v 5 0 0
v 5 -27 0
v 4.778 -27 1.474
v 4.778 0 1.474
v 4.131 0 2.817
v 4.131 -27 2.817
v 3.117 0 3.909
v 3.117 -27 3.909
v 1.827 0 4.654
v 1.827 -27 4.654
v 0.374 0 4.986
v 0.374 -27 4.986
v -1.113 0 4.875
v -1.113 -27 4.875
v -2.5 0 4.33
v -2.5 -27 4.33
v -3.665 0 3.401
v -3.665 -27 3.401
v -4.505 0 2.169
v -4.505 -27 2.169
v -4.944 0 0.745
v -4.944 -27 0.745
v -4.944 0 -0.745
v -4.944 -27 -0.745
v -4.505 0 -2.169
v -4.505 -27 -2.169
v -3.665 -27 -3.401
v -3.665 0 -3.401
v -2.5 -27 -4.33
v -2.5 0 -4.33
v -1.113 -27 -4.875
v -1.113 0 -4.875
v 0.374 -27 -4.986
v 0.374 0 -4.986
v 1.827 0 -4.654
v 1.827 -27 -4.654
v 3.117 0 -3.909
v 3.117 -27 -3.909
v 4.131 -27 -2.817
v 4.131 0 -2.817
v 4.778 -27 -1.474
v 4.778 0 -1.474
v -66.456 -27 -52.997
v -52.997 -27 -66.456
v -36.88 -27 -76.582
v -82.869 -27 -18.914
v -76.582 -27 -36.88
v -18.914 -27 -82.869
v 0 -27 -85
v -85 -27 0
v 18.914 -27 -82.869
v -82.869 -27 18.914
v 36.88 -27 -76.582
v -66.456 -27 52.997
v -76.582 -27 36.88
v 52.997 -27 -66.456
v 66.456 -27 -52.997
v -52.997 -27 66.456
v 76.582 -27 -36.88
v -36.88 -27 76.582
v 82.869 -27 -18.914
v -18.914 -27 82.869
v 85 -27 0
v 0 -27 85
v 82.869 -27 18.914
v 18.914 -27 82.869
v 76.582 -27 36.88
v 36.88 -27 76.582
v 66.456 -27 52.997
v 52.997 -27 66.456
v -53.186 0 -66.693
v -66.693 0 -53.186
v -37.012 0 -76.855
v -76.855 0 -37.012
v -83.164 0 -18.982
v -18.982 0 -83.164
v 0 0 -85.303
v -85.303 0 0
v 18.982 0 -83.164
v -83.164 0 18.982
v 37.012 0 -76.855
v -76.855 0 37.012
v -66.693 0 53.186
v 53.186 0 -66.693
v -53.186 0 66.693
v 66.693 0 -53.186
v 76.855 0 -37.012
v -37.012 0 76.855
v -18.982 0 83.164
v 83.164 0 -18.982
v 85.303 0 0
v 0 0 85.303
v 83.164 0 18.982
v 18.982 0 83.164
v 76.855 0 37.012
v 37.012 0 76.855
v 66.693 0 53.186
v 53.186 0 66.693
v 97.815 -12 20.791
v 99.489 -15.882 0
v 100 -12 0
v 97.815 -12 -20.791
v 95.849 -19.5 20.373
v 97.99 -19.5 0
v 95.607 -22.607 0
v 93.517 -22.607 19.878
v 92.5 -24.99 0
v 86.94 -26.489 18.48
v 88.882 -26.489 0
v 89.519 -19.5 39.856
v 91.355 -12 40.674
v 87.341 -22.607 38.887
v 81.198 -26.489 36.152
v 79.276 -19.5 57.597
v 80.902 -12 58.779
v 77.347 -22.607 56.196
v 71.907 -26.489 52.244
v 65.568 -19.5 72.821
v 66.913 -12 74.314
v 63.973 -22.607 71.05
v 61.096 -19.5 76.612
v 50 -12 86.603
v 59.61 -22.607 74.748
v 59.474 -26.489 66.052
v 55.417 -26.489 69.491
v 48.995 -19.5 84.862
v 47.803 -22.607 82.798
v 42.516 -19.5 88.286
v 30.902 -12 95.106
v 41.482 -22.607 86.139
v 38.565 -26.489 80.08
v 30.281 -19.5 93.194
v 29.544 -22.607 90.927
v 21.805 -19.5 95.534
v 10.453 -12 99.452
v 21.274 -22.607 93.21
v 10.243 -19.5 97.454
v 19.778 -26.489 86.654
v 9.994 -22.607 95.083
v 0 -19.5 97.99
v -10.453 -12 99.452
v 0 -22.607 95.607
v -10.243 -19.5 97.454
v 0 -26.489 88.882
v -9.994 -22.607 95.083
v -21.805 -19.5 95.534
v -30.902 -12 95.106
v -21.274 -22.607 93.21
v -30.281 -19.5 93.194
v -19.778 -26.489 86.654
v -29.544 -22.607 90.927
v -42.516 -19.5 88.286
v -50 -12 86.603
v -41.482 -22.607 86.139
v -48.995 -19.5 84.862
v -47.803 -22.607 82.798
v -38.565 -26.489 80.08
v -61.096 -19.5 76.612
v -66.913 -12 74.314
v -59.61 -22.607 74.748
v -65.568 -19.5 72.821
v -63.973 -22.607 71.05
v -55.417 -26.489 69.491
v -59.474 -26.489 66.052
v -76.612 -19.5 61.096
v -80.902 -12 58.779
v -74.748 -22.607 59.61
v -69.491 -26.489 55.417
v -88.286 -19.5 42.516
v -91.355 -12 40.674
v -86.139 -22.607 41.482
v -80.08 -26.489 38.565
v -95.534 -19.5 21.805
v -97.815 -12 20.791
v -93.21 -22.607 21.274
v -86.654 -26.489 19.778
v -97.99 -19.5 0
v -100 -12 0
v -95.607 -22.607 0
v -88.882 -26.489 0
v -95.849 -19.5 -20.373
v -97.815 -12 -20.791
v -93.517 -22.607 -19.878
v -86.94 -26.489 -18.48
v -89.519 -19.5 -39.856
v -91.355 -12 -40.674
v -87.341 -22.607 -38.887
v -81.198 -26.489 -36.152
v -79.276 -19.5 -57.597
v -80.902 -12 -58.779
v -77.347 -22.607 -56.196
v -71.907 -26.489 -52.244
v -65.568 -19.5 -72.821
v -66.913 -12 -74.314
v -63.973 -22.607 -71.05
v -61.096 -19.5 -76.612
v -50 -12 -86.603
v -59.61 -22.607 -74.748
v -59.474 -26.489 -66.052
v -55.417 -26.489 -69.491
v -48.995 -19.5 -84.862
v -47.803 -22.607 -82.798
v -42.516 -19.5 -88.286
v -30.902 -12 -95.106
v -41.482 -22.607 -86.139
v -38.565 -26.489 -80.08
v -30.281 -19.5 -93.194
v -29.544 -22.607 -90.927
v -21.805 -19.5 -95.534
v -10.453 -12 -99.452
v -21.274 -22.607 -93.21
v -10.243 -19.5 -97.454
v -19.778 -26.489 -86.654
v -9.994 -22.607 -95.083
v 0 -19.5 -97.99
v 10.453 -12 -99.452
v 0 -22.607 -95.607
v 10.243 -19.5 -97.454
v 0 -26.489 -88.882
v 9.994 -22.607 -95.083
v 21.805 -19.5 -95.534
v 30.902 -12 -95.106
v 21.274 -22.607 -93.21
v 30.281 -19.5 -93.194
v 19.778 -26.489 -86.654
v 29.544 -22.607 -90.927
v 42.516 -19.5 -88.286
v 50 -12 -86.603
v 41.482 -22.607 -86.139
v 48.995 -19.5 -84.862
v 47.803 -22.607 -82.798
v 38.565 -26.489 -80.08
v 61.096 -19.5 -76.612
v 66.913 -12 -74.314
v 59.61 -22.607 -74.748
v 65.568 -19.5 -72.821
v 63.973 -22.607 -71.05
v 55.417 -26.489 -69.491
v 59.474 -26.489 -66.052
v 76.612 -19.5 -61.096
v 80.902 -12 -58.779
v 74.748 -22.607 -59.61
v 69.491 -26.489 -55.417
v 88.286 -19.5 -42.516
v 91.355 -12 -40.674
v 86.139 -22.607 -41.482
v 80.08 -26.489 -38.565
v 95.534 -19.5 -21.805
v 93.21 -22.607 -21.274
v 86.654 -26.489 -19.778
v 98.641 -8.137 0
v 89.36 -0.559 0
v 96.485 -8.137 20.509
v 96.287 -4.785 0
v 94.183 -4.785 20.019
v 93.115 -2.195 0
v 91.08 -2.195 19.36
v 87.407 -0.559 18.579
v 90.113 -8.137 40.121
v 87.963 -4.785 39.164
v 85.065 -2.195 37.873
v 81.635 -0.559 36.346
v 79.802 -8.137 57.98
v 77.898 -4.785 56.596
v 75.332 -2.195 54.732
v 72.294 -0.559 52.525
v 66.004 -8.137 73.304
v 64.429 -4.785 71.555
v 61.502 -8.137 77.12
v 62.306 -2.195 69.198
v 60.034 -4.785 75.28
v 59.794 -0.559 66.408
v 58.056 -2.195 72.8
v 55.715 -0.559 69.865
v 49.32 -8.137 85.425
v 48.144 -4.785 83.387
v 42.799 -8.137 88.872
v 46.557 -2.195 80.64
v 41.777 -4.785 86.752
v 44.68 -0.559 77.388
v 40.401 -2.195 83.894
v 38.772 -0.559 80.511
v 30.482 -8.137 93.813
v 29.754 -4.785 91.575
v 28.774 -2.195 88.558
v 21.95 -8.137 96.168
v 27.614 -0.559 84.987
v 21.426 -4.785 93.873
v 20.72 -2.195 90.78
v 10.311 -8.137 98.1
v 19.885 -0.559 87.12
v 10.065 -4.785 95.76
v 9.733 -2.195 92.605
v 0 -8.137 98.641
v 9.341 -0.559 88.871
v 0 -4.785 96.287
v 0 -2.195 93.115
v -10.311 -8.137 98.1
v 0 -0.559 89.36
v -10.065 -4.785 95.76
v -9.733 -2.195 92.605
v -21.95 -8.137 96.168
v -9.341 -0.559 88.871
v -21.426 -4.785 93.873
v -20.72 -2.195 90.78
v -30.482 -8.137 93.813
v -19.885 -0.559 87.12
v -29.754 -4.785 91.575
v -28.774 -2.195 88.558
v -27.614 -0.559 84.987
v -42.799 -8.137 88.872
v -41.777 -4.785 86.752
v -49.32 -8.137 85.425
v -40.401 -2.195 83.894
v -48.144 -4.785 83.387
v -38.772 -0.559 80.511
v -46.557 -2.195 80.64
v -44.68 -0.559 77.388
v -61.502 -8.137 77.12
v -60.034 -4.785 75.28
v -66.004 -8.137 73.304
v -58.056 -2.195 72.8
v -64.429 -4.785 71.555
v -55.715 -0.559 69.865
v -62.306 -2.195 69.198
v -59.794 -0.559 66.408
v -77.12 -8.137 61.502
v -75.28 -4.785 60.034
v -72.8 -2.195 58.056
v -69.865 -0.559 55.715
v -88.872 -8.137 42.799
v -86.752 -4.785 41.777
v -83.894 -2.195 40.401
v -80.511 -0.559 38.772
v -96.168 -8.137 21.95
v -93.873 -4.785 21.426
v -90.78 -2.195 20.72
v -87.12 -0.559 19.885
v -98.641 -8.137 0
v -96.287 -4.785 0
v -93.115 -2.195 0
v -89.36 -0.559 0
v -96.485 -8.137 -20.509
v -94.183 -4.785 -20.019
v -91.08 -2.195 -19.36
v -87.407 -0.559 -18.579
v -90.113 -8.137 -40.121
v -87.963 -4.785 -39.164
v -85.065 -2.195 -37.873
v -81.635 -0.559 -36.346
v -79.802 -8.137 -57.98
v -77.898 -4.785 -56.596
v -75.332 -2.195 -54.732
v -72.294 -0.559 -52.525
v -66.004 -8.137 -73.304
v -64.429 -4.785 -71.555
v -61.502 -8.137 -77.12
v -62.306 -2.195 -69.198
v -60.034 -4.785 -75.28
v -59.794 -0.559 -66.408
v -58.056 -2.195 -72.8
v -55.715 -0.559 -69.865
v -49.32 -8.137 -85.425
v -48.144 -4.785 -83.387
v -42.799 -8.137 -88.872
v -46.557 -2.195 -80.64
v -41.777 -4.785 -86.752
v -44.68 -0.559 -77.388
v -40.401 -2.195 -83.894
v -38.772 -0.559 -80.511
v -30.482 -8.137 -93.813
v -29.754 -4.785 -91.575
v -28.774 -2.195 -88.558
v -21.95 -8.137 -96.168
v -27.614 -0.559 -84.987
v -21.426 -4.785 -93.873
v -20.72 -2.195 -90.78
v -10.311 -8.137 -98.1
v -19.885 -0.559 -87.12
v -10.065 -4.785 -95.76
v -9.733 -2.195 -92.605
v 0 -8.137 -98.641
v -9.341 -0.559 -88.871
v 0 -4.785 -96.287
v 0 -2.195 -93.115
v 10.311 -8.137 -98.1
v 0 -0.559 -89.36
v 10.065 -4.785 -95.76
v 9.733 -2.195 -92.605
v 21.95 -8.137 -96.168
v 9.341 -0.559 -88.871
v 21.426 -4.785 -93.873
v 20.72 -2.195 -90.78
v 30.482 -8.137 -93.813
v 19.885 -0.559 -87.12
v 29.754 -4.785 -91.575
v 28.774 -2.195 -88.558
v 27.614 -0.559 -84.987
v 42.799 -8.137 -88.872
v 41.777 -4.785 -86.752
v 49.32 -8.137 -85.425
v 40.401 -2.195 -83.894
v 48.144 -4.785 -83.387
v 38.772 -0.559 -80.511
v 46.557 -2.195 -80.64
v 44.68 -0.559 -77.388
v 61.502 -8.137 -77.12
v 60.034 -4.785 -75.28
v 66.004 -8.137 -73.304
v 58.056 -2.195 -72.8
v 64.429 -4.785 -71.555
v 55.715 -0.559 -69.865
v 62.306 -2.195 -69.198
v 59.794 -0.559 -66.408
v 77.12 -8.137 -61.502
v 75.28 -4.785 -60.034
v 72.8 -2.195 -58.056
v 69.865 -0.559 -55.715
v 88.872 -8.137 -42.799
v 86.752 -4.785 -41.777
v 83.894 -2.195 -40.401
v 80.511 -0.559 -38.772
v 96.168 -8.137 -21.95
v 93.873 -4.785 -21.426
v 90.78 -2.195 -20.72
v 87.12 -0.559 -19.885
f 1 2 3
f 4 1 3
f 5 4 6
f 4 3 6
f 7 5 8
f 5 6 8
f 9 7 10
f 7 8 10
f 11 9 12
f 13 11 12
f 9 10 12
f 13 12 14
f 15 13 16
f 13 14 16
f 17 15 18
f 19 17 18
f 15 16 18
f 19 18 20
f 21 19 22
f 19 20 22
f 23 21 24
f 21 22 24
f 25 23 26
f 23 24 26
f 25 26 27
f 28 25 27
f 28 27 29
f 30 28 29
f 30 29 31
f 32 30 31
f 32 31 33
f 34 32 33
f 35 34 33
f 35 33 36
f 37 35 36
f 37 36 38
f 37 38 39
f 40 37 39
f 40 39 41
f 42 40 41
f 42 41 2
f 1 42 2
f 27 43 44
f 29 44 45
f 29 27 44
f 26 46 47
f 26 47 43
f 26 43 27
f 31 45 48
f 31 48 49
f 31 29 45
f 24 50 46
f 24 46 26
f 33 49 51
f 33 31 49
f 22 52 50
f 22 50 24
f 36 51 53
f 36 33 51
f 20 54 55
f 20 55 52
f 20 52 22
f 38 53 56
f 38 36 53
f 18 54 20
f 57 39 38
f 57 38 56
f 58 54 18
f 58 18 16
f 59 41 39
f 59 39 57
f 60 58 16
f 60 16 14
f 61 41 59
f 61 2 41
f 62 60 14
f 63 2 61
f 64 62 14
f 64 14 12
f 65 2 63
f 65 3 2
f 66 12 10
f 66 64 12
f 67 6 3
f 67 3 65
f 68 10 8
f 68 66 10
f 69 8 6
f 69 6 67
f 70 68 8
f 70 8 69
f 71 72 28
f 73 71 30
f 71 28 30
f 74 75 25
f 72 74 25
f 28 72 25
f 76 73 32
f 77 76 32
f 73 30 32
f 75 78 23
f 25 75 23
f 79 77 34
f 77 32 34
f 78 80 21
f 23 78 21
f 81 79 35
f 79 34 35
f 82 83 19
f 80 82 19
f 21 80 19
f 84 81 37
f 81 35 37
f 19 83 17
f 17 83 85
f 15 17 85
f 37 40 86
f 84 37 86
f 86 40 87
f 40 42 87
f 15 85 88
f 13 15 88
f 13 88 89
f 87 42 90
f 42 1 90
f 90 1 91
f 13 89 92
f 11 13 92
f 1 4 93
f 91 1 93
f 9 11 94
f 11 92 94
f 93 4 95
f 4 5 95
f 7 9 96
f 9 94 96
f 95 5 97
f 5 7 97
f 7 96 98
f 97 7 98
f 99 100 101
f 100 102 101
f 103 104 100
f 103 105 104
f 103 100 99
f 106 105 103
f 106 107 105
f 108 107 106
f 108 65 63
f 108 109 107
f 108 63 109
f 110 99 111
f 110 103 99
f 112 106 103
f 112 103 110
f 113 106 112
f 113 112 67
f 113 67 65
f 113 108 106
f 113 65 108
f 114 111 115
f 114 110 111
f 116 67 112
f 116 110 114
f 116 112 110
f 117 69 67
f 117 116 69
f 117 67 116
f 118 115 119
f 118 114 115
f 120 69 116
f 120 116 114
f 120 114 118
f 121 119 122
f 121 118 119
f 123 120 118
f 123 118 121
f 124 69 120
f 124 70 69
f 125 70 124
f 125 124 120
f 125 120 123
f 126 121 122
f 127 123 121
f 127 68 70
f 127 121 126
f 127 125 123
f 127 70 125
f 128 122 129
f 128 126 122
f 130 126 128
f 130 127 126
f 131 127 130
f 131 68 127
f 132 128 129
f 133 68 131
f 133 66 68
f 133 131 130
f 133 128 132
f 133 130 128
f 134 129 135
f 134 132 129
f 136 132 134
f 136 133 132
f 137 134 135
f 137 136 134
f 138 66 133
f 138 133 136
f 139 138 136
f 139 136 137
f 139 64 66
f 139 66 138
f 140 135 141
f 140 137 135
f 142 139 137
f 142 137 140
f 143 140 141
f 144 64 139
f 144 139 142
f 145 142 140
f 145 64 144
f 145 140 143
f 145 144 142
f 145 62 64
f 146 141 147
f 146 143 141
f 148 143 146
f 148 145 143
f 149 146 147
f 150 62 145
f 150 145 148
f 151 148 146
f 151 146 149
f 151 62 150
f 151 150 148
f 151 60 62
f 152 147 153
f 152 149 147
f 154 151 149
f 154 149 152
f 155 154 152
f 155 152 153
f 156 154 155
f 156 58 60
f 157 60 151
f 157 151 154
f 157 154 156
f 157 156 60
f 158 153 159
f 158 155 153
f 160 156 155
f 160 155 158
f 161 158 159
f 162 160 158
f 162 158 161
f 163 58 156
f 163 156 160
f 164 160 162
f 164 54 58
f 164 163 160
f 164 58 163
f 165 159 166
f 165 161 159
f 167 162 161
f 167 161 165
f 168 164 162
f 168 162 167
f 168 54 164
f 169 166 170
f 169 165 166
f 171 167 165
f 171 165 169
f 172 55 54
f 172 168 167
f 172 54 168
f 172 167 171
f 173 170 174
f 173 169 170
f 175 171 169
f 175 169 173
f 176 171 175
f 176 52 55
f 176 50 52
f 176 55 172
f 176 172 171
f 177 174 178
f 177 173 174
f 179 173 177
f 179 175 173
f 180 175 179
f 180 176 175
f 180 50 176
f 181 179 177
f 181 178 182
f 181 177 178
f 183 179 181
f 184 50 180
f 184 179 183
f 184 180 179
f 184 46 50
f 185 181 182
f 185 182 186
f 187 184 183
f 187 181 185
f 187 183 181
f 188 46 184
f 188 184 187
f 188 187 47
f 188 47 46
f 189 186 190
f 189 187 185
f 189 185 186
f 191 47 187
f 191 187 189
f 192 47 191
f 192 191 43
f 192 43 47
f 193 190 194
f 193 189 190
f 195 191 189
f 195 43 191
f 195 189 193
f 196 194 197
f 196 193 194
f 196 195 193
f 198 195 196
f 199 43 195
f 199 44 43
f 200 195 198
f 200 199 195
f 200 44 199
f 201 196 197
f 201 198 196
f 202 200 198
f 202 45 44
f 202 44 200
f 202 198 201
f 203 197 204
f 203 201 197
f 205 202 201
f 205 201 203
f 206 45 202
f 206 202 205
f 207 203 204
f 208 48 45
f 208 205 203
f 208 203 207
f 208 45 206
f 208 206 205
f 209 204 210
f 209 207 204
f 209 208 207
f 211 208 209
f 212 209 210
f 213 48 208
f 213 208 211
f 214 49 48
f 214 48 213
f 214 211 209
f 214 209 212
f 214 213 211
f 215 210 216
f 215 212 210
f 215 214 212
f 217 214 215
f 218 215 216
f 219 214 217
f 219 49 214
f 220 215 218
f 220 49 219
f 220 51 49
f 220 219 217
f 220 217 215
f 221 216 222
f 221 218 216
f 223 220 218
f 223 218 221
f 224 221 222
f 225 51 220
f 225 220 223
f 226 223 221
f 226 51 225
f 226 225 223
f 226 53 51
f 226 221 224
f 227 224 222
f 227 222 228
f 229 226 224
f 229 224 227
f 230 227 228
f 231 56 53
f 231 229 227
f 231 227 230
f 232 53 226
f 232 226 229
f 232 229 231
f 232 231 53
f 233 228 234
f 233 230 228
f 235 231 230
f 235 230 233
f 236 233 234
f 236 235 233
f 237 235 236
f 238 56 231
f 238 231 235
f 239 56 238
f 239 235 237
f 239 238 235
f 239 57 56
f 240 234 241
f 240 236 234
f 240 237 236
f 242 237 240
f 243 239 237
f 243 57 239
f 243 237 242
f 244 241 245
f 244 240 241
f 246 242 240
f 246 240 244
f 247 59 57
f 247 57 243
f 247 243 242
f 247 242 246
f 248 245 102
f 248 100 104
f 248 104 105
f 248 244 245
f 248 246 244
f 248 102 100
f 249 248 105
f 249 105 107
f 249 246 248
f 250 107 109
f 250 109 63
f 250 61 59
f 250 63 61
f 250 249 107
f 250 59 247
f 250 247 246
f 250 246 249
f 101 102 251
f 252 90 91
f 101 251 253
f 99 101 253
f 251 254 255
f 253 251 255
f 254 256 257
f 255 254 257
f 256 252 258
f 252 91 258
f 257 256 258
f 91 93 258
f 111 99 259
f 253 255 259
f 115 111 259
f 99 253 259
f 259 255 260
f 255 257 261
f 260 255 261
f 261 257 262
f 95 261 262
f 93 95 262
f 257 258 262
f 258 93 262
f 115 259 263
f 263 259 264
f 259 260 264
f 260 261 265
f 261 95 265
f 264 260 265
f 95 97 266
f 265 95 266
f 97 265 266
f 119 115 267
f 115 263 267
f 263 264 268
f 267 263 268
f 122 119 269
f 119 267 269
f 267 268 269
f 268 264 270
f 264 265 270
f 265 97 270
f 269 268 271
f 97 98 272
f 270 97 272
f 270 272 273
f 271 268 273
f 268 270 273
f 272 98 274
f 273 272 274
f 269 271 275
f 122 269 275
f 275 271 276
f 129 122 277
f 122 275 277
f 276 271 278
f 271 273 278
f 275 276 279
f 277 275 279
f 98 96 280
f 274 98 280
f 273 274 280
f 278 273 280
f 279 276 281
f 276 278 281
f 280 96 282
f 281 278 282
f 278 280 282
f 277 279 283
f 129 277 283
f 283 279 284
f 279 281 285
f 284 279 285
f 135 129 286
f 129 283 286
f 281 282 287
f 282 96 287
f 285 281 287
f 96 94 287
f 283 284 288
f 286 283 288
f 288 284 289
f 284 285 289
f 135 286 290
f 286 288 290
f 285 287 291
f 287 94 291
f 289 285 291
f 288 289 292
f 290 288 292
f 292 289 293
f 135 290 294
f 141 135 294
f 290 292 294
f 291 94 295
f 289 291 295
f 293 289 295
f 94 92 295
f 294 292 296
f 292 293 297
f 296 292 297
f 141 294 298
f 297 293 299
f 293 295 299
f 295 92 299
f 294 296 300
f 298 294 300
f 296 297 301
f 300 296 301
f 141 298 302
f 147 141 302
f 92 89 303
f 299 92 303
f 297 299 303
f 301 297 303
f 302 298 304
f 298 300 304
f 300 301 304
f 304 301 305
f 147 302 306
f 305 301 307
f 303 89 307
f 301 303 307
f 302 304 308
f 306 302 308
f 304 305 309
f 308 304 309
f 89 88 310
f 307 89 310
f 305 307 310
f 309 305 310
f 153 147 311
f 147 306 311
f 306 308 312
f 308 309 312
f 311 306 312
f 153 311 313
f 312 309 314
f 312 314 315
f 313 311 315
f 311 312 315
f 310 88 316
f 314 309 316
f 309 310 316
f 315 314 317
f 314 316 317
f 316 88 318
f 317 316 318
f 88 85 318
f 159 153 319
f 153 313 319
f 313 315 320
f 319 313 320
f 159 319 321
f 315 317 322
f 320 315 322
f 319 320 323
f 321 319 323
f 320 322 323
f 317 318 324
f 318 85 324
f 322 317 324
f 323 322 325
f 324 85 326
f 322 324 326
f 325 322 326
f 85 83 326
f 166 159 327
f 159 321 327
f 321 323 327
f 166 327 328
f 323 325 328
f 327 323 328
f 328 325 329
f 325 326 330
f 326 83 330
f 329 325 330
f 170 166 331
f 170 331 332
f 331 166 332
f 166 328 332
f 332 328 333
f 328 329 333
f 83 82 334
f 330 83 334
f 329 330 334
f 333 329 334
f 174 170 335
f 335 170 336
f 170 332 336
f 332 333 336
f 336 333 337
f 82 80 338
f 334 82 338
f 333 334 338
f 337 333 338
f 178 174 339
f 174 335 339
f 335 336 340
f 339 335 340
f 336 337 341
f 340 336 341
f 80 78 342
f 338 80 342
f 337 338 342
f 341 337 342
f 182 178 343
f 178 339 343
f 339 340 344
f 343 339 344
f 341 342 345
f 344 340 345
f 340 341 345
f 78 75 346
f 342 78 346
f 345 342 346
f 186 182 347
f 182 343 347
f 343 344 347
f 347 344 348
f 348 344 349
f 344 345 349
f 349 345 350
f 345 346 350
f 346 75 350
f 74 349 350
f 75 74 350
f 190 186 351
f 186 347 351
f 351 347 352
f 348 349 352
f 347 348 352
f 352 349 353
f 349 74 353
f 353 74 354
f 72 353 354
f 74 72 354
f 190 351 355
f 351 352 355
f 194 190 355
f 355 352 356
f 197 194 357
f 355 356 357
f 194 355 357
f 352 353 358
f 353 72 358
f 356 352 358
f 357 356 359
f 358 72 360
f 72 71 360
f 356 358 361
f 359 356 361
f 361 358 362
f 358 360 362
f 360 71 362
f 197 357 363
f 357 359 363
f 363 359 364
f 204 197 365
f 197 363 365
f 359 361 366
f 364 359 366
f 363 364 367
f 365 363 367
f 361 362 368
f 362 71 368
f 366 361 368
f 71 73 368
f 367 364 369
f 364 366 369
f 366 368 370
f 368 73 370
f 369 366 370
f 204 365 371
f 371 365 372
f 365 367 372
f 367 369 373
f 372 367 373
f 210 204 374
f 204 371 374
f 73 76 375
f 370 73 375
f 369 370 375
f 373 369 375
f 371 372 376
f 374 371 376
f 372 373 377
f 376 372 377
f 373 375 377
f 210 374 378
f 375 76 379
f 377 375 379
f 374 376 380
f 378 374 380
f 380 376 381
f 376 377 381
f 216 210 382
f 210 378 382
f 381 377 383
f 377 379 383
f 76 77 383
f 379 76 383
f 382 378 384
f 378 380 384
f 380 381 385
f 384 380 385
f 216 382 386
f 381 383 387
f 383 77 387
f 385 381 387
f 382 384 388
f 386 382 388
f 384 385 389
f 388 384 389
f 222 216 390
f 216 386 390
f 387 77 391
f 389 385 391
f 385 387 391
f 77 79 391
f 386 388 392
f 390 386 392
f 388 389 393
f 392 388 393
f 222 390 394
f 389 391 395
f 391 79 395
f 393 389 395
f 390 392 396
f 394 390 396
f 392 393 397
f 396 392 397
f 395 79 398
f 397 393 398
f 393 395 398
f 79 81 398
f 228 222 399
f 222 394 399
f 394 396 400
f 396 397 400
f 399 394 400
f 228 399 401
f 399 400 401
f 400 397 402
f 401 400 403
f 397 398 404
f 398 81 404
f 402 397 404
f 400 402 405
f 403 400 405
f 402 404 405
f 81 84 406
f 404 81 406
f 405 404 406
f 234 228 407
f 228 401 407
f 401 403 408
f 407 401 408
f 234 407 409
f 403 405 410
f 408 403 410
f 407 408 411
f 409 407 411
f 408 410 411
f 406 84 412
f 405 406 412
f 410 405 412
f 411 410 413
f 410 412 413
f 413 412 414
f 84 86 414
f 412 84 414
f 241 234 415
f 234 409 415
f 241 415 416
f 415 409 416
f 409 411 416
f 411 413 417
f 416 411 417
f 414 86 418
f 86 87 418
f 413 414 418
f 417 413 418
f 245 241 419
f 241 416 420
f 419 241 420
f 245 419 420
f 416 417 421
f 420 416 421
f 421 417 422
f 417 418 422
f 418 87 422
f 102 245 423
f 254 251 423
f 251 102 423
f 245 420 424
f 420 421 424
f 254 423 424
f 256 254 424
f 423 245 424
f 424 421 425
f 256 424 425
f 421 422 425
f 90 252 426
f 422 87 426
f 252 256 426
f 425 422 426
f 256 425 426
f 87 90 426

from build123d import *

# Parameters (mm, degrees)
F0_R     = 100
F1_DEPTH = 27
F2_R     = 15
F4_R     = 5
F5_DEPTH = 30


# Not quite as in the source:
# - a fillet or chamfer that OpenCascade refuses, or shapes differently, is made with other operations: its cross-section is extruded or revolved along the edge and cut away or added


with BuildPart() as f1:
    # F0 (on Front) → F1 (new body)
    with BuildSketch(Plane.XZ):
        Circle(F0_R)
    extrude(amount=F1_DEPTH)

    # F2
    f2_edges = [f1.edges().sort_by_distance(p)[0] for p in [
        (-100, -27, 0),
    ]]
    fillet(f2_edges, radius=F2_R)

    # F3: fillet of radius 15 on 1 edges, made by hand

    # F3_s1 → F3_t2 (revolve, cut)
    with BuildSketch(Plane.XY):
        with BuildLine():
            ThreePointArc((100, -12), (94.7898945238, -3.3810499614), (85.3030615433, 0))
            Line((85.3030615433, 0), (100, 0))
            Line((100, 0), (100, -12))
        make_face()
    revolve(axis=Axis((0, 0, 0), (0, -1, 0)), mode=Mode.SUBTRACT)

    # F4 (on face) → F5 (cut)
    with BuildSketch(Plane.XZ.offset(27)):
        Circle(F4_R)
    extrude(amount=-F5_DEPTH, mode=Mode.SUBTRACT)


solid = f1.part
